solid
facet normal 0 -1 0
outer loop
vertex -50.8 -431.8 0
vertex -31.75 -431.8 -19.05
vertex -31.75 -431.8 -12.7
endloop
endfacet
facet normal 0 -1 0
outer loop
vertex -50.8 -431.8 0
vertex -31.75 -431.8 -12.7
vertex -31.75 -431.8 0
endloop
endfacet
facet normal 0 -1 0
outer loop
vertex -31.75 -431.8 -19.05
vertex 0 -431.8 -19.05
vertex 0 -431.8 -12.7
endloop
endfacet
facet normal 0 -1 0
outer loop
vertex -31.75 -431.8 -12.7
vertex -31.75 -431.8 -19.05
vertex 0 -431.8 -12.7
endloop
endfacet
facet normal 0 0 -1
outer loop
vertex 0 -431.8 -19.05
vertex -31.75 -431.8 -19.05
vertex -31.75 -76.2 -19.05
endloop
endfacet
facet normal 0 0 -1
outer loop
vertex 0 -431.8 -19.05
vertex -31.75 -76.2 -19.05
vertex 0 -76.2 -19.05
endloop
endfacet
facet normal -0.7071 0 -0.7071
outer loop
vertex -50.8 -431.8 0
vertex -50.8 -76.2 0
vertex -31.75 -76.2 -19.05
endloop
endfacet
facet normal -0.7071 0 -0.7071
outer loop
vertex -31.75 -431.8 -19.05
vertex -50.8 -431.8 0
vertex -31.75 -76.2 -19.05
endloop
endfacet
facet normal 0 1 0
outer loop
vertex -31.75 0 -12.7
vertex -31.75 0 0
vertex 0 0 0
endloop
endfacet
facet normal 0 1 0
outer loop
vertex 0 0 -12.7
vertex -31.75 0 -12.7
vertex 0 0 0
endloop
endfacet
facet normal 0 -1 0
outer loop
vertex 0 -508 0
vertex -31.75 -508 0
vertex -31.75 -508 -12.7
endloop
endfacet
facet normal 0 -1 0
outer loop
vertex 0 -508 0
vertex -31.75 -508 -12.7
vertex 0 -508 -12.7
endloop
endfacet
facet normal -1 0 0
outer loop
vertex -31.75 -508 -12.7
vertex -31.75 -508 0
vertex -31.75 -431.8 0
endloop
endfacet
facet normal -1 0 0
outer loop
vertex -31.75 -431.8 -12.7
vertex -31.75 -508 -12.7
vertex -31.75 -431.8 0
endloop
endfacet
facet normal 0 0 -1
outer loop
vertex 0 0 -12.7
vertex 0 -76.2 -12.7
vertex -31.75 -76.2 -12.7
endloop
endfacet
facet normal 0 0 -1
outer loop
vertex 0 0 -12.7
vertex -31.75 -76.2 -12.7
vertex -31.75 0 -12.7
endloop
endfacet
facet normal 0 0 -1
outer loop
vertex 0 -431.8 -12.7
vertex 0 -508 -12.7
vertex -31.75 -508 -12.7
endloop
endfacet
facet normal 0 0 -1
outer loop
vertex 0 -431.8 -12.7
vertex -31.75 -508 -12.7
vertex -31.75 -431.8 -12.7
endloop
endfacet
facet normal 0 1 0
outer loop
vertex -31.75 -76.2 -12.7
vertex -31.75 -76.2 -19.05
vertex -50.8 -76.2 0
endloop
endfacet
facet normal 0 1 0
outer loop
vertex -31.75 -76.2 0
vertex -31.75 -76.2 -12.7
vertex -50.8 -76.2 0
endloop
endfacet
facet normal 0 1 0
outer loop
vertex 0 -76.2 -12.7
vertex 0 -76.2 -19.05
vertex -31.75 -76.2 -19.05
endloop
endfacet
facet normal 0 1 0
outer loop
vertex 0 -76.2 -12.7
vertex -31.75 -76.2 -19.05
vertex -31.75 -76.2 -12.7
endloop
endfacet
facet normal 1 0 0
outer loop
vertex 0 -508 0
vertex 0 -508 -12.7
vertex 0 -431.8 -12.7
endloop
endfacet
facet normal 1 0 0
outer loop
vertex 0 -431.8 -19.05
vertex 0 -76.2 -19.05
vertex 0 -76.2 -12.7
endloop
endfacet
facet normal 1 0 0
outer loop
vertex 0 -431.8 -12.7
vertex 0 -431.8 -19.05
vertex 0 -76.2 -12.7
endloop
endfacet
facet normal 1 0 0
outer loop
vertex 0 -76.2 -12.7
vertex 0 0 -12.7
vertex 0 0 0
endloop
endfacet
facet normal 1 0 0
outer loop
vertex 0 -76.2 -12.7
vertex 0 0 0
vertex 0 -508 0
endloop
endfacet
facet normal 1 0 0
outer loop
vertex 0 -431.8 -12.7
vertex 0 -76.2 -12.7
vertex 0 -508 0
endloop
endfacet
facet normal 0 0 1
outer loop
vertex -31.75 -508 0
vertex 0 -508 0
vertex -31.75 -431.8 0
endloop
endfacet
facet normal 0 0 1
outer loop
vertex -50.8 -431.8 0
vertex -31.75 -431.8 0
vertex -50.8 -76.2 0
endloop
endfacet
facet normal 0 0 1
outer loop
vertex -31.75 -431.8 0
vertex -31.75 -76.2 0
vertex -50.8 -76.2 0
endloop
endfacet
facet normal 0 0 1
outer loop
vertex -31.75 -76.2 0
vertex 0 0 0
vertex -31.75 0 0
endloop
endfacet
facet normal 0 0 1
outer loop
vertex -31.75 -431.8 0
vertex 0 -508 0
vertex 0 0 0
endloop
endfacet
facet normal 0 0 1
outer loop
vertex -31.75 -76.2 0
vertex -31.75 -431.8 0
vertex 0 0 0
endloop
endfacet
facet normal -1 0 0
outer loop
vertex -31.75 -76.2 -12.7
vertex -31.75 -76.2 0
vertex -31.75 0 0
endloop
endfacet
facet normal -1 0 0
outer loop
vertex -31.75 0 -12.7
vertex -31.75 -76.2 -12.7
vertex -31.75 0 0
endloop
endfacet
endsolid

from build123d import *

# Parameters (mm, degrees)
F1_DEPTH = 508
F2_W     = 19.05
F2_H     = 76.2
F3_DEPTH = 25.4
F4_W     = 76.2
F4_H     = 6.35
F5_DEPTH = 50.801


with BuildPart() as f1:
    # F0 (on Front) → F1 (new body)
    with BuildSketch(Plane.XZ):
        Polygon((0, -19.05), (0, 0), (-50.8, 0), (-31.75, -19.05), align=None)
    extrude(amount=F1_DEPTH)

    # F2 (on face) → F3 (cut)
    with BuildSketch(Plane.XY):
        with Locations((-41.275, -38.1)):
            Rectangle(F2_W, F2_H)
        with Locations((-41.275, -469.9)):
            Rectangle(F2_W, F2_H)
    extrude(amount=-F3_DEPTH, mode=Mode.SUBTRACT)

    # F4 (on face) → F5 (cut, through all)
    with BuildSketch(Plane.YZ):
        with Locations((-469.9, -15.875)):
            Rectangle(F4_W, F4_H)
        with Locations((-38.1, -15.875)):
            Rectangle(F4_W, F4_H)
    extrude(amount=-F5_DEPTH, mode=Mode.SUBTRACT)


solid = f1.part
